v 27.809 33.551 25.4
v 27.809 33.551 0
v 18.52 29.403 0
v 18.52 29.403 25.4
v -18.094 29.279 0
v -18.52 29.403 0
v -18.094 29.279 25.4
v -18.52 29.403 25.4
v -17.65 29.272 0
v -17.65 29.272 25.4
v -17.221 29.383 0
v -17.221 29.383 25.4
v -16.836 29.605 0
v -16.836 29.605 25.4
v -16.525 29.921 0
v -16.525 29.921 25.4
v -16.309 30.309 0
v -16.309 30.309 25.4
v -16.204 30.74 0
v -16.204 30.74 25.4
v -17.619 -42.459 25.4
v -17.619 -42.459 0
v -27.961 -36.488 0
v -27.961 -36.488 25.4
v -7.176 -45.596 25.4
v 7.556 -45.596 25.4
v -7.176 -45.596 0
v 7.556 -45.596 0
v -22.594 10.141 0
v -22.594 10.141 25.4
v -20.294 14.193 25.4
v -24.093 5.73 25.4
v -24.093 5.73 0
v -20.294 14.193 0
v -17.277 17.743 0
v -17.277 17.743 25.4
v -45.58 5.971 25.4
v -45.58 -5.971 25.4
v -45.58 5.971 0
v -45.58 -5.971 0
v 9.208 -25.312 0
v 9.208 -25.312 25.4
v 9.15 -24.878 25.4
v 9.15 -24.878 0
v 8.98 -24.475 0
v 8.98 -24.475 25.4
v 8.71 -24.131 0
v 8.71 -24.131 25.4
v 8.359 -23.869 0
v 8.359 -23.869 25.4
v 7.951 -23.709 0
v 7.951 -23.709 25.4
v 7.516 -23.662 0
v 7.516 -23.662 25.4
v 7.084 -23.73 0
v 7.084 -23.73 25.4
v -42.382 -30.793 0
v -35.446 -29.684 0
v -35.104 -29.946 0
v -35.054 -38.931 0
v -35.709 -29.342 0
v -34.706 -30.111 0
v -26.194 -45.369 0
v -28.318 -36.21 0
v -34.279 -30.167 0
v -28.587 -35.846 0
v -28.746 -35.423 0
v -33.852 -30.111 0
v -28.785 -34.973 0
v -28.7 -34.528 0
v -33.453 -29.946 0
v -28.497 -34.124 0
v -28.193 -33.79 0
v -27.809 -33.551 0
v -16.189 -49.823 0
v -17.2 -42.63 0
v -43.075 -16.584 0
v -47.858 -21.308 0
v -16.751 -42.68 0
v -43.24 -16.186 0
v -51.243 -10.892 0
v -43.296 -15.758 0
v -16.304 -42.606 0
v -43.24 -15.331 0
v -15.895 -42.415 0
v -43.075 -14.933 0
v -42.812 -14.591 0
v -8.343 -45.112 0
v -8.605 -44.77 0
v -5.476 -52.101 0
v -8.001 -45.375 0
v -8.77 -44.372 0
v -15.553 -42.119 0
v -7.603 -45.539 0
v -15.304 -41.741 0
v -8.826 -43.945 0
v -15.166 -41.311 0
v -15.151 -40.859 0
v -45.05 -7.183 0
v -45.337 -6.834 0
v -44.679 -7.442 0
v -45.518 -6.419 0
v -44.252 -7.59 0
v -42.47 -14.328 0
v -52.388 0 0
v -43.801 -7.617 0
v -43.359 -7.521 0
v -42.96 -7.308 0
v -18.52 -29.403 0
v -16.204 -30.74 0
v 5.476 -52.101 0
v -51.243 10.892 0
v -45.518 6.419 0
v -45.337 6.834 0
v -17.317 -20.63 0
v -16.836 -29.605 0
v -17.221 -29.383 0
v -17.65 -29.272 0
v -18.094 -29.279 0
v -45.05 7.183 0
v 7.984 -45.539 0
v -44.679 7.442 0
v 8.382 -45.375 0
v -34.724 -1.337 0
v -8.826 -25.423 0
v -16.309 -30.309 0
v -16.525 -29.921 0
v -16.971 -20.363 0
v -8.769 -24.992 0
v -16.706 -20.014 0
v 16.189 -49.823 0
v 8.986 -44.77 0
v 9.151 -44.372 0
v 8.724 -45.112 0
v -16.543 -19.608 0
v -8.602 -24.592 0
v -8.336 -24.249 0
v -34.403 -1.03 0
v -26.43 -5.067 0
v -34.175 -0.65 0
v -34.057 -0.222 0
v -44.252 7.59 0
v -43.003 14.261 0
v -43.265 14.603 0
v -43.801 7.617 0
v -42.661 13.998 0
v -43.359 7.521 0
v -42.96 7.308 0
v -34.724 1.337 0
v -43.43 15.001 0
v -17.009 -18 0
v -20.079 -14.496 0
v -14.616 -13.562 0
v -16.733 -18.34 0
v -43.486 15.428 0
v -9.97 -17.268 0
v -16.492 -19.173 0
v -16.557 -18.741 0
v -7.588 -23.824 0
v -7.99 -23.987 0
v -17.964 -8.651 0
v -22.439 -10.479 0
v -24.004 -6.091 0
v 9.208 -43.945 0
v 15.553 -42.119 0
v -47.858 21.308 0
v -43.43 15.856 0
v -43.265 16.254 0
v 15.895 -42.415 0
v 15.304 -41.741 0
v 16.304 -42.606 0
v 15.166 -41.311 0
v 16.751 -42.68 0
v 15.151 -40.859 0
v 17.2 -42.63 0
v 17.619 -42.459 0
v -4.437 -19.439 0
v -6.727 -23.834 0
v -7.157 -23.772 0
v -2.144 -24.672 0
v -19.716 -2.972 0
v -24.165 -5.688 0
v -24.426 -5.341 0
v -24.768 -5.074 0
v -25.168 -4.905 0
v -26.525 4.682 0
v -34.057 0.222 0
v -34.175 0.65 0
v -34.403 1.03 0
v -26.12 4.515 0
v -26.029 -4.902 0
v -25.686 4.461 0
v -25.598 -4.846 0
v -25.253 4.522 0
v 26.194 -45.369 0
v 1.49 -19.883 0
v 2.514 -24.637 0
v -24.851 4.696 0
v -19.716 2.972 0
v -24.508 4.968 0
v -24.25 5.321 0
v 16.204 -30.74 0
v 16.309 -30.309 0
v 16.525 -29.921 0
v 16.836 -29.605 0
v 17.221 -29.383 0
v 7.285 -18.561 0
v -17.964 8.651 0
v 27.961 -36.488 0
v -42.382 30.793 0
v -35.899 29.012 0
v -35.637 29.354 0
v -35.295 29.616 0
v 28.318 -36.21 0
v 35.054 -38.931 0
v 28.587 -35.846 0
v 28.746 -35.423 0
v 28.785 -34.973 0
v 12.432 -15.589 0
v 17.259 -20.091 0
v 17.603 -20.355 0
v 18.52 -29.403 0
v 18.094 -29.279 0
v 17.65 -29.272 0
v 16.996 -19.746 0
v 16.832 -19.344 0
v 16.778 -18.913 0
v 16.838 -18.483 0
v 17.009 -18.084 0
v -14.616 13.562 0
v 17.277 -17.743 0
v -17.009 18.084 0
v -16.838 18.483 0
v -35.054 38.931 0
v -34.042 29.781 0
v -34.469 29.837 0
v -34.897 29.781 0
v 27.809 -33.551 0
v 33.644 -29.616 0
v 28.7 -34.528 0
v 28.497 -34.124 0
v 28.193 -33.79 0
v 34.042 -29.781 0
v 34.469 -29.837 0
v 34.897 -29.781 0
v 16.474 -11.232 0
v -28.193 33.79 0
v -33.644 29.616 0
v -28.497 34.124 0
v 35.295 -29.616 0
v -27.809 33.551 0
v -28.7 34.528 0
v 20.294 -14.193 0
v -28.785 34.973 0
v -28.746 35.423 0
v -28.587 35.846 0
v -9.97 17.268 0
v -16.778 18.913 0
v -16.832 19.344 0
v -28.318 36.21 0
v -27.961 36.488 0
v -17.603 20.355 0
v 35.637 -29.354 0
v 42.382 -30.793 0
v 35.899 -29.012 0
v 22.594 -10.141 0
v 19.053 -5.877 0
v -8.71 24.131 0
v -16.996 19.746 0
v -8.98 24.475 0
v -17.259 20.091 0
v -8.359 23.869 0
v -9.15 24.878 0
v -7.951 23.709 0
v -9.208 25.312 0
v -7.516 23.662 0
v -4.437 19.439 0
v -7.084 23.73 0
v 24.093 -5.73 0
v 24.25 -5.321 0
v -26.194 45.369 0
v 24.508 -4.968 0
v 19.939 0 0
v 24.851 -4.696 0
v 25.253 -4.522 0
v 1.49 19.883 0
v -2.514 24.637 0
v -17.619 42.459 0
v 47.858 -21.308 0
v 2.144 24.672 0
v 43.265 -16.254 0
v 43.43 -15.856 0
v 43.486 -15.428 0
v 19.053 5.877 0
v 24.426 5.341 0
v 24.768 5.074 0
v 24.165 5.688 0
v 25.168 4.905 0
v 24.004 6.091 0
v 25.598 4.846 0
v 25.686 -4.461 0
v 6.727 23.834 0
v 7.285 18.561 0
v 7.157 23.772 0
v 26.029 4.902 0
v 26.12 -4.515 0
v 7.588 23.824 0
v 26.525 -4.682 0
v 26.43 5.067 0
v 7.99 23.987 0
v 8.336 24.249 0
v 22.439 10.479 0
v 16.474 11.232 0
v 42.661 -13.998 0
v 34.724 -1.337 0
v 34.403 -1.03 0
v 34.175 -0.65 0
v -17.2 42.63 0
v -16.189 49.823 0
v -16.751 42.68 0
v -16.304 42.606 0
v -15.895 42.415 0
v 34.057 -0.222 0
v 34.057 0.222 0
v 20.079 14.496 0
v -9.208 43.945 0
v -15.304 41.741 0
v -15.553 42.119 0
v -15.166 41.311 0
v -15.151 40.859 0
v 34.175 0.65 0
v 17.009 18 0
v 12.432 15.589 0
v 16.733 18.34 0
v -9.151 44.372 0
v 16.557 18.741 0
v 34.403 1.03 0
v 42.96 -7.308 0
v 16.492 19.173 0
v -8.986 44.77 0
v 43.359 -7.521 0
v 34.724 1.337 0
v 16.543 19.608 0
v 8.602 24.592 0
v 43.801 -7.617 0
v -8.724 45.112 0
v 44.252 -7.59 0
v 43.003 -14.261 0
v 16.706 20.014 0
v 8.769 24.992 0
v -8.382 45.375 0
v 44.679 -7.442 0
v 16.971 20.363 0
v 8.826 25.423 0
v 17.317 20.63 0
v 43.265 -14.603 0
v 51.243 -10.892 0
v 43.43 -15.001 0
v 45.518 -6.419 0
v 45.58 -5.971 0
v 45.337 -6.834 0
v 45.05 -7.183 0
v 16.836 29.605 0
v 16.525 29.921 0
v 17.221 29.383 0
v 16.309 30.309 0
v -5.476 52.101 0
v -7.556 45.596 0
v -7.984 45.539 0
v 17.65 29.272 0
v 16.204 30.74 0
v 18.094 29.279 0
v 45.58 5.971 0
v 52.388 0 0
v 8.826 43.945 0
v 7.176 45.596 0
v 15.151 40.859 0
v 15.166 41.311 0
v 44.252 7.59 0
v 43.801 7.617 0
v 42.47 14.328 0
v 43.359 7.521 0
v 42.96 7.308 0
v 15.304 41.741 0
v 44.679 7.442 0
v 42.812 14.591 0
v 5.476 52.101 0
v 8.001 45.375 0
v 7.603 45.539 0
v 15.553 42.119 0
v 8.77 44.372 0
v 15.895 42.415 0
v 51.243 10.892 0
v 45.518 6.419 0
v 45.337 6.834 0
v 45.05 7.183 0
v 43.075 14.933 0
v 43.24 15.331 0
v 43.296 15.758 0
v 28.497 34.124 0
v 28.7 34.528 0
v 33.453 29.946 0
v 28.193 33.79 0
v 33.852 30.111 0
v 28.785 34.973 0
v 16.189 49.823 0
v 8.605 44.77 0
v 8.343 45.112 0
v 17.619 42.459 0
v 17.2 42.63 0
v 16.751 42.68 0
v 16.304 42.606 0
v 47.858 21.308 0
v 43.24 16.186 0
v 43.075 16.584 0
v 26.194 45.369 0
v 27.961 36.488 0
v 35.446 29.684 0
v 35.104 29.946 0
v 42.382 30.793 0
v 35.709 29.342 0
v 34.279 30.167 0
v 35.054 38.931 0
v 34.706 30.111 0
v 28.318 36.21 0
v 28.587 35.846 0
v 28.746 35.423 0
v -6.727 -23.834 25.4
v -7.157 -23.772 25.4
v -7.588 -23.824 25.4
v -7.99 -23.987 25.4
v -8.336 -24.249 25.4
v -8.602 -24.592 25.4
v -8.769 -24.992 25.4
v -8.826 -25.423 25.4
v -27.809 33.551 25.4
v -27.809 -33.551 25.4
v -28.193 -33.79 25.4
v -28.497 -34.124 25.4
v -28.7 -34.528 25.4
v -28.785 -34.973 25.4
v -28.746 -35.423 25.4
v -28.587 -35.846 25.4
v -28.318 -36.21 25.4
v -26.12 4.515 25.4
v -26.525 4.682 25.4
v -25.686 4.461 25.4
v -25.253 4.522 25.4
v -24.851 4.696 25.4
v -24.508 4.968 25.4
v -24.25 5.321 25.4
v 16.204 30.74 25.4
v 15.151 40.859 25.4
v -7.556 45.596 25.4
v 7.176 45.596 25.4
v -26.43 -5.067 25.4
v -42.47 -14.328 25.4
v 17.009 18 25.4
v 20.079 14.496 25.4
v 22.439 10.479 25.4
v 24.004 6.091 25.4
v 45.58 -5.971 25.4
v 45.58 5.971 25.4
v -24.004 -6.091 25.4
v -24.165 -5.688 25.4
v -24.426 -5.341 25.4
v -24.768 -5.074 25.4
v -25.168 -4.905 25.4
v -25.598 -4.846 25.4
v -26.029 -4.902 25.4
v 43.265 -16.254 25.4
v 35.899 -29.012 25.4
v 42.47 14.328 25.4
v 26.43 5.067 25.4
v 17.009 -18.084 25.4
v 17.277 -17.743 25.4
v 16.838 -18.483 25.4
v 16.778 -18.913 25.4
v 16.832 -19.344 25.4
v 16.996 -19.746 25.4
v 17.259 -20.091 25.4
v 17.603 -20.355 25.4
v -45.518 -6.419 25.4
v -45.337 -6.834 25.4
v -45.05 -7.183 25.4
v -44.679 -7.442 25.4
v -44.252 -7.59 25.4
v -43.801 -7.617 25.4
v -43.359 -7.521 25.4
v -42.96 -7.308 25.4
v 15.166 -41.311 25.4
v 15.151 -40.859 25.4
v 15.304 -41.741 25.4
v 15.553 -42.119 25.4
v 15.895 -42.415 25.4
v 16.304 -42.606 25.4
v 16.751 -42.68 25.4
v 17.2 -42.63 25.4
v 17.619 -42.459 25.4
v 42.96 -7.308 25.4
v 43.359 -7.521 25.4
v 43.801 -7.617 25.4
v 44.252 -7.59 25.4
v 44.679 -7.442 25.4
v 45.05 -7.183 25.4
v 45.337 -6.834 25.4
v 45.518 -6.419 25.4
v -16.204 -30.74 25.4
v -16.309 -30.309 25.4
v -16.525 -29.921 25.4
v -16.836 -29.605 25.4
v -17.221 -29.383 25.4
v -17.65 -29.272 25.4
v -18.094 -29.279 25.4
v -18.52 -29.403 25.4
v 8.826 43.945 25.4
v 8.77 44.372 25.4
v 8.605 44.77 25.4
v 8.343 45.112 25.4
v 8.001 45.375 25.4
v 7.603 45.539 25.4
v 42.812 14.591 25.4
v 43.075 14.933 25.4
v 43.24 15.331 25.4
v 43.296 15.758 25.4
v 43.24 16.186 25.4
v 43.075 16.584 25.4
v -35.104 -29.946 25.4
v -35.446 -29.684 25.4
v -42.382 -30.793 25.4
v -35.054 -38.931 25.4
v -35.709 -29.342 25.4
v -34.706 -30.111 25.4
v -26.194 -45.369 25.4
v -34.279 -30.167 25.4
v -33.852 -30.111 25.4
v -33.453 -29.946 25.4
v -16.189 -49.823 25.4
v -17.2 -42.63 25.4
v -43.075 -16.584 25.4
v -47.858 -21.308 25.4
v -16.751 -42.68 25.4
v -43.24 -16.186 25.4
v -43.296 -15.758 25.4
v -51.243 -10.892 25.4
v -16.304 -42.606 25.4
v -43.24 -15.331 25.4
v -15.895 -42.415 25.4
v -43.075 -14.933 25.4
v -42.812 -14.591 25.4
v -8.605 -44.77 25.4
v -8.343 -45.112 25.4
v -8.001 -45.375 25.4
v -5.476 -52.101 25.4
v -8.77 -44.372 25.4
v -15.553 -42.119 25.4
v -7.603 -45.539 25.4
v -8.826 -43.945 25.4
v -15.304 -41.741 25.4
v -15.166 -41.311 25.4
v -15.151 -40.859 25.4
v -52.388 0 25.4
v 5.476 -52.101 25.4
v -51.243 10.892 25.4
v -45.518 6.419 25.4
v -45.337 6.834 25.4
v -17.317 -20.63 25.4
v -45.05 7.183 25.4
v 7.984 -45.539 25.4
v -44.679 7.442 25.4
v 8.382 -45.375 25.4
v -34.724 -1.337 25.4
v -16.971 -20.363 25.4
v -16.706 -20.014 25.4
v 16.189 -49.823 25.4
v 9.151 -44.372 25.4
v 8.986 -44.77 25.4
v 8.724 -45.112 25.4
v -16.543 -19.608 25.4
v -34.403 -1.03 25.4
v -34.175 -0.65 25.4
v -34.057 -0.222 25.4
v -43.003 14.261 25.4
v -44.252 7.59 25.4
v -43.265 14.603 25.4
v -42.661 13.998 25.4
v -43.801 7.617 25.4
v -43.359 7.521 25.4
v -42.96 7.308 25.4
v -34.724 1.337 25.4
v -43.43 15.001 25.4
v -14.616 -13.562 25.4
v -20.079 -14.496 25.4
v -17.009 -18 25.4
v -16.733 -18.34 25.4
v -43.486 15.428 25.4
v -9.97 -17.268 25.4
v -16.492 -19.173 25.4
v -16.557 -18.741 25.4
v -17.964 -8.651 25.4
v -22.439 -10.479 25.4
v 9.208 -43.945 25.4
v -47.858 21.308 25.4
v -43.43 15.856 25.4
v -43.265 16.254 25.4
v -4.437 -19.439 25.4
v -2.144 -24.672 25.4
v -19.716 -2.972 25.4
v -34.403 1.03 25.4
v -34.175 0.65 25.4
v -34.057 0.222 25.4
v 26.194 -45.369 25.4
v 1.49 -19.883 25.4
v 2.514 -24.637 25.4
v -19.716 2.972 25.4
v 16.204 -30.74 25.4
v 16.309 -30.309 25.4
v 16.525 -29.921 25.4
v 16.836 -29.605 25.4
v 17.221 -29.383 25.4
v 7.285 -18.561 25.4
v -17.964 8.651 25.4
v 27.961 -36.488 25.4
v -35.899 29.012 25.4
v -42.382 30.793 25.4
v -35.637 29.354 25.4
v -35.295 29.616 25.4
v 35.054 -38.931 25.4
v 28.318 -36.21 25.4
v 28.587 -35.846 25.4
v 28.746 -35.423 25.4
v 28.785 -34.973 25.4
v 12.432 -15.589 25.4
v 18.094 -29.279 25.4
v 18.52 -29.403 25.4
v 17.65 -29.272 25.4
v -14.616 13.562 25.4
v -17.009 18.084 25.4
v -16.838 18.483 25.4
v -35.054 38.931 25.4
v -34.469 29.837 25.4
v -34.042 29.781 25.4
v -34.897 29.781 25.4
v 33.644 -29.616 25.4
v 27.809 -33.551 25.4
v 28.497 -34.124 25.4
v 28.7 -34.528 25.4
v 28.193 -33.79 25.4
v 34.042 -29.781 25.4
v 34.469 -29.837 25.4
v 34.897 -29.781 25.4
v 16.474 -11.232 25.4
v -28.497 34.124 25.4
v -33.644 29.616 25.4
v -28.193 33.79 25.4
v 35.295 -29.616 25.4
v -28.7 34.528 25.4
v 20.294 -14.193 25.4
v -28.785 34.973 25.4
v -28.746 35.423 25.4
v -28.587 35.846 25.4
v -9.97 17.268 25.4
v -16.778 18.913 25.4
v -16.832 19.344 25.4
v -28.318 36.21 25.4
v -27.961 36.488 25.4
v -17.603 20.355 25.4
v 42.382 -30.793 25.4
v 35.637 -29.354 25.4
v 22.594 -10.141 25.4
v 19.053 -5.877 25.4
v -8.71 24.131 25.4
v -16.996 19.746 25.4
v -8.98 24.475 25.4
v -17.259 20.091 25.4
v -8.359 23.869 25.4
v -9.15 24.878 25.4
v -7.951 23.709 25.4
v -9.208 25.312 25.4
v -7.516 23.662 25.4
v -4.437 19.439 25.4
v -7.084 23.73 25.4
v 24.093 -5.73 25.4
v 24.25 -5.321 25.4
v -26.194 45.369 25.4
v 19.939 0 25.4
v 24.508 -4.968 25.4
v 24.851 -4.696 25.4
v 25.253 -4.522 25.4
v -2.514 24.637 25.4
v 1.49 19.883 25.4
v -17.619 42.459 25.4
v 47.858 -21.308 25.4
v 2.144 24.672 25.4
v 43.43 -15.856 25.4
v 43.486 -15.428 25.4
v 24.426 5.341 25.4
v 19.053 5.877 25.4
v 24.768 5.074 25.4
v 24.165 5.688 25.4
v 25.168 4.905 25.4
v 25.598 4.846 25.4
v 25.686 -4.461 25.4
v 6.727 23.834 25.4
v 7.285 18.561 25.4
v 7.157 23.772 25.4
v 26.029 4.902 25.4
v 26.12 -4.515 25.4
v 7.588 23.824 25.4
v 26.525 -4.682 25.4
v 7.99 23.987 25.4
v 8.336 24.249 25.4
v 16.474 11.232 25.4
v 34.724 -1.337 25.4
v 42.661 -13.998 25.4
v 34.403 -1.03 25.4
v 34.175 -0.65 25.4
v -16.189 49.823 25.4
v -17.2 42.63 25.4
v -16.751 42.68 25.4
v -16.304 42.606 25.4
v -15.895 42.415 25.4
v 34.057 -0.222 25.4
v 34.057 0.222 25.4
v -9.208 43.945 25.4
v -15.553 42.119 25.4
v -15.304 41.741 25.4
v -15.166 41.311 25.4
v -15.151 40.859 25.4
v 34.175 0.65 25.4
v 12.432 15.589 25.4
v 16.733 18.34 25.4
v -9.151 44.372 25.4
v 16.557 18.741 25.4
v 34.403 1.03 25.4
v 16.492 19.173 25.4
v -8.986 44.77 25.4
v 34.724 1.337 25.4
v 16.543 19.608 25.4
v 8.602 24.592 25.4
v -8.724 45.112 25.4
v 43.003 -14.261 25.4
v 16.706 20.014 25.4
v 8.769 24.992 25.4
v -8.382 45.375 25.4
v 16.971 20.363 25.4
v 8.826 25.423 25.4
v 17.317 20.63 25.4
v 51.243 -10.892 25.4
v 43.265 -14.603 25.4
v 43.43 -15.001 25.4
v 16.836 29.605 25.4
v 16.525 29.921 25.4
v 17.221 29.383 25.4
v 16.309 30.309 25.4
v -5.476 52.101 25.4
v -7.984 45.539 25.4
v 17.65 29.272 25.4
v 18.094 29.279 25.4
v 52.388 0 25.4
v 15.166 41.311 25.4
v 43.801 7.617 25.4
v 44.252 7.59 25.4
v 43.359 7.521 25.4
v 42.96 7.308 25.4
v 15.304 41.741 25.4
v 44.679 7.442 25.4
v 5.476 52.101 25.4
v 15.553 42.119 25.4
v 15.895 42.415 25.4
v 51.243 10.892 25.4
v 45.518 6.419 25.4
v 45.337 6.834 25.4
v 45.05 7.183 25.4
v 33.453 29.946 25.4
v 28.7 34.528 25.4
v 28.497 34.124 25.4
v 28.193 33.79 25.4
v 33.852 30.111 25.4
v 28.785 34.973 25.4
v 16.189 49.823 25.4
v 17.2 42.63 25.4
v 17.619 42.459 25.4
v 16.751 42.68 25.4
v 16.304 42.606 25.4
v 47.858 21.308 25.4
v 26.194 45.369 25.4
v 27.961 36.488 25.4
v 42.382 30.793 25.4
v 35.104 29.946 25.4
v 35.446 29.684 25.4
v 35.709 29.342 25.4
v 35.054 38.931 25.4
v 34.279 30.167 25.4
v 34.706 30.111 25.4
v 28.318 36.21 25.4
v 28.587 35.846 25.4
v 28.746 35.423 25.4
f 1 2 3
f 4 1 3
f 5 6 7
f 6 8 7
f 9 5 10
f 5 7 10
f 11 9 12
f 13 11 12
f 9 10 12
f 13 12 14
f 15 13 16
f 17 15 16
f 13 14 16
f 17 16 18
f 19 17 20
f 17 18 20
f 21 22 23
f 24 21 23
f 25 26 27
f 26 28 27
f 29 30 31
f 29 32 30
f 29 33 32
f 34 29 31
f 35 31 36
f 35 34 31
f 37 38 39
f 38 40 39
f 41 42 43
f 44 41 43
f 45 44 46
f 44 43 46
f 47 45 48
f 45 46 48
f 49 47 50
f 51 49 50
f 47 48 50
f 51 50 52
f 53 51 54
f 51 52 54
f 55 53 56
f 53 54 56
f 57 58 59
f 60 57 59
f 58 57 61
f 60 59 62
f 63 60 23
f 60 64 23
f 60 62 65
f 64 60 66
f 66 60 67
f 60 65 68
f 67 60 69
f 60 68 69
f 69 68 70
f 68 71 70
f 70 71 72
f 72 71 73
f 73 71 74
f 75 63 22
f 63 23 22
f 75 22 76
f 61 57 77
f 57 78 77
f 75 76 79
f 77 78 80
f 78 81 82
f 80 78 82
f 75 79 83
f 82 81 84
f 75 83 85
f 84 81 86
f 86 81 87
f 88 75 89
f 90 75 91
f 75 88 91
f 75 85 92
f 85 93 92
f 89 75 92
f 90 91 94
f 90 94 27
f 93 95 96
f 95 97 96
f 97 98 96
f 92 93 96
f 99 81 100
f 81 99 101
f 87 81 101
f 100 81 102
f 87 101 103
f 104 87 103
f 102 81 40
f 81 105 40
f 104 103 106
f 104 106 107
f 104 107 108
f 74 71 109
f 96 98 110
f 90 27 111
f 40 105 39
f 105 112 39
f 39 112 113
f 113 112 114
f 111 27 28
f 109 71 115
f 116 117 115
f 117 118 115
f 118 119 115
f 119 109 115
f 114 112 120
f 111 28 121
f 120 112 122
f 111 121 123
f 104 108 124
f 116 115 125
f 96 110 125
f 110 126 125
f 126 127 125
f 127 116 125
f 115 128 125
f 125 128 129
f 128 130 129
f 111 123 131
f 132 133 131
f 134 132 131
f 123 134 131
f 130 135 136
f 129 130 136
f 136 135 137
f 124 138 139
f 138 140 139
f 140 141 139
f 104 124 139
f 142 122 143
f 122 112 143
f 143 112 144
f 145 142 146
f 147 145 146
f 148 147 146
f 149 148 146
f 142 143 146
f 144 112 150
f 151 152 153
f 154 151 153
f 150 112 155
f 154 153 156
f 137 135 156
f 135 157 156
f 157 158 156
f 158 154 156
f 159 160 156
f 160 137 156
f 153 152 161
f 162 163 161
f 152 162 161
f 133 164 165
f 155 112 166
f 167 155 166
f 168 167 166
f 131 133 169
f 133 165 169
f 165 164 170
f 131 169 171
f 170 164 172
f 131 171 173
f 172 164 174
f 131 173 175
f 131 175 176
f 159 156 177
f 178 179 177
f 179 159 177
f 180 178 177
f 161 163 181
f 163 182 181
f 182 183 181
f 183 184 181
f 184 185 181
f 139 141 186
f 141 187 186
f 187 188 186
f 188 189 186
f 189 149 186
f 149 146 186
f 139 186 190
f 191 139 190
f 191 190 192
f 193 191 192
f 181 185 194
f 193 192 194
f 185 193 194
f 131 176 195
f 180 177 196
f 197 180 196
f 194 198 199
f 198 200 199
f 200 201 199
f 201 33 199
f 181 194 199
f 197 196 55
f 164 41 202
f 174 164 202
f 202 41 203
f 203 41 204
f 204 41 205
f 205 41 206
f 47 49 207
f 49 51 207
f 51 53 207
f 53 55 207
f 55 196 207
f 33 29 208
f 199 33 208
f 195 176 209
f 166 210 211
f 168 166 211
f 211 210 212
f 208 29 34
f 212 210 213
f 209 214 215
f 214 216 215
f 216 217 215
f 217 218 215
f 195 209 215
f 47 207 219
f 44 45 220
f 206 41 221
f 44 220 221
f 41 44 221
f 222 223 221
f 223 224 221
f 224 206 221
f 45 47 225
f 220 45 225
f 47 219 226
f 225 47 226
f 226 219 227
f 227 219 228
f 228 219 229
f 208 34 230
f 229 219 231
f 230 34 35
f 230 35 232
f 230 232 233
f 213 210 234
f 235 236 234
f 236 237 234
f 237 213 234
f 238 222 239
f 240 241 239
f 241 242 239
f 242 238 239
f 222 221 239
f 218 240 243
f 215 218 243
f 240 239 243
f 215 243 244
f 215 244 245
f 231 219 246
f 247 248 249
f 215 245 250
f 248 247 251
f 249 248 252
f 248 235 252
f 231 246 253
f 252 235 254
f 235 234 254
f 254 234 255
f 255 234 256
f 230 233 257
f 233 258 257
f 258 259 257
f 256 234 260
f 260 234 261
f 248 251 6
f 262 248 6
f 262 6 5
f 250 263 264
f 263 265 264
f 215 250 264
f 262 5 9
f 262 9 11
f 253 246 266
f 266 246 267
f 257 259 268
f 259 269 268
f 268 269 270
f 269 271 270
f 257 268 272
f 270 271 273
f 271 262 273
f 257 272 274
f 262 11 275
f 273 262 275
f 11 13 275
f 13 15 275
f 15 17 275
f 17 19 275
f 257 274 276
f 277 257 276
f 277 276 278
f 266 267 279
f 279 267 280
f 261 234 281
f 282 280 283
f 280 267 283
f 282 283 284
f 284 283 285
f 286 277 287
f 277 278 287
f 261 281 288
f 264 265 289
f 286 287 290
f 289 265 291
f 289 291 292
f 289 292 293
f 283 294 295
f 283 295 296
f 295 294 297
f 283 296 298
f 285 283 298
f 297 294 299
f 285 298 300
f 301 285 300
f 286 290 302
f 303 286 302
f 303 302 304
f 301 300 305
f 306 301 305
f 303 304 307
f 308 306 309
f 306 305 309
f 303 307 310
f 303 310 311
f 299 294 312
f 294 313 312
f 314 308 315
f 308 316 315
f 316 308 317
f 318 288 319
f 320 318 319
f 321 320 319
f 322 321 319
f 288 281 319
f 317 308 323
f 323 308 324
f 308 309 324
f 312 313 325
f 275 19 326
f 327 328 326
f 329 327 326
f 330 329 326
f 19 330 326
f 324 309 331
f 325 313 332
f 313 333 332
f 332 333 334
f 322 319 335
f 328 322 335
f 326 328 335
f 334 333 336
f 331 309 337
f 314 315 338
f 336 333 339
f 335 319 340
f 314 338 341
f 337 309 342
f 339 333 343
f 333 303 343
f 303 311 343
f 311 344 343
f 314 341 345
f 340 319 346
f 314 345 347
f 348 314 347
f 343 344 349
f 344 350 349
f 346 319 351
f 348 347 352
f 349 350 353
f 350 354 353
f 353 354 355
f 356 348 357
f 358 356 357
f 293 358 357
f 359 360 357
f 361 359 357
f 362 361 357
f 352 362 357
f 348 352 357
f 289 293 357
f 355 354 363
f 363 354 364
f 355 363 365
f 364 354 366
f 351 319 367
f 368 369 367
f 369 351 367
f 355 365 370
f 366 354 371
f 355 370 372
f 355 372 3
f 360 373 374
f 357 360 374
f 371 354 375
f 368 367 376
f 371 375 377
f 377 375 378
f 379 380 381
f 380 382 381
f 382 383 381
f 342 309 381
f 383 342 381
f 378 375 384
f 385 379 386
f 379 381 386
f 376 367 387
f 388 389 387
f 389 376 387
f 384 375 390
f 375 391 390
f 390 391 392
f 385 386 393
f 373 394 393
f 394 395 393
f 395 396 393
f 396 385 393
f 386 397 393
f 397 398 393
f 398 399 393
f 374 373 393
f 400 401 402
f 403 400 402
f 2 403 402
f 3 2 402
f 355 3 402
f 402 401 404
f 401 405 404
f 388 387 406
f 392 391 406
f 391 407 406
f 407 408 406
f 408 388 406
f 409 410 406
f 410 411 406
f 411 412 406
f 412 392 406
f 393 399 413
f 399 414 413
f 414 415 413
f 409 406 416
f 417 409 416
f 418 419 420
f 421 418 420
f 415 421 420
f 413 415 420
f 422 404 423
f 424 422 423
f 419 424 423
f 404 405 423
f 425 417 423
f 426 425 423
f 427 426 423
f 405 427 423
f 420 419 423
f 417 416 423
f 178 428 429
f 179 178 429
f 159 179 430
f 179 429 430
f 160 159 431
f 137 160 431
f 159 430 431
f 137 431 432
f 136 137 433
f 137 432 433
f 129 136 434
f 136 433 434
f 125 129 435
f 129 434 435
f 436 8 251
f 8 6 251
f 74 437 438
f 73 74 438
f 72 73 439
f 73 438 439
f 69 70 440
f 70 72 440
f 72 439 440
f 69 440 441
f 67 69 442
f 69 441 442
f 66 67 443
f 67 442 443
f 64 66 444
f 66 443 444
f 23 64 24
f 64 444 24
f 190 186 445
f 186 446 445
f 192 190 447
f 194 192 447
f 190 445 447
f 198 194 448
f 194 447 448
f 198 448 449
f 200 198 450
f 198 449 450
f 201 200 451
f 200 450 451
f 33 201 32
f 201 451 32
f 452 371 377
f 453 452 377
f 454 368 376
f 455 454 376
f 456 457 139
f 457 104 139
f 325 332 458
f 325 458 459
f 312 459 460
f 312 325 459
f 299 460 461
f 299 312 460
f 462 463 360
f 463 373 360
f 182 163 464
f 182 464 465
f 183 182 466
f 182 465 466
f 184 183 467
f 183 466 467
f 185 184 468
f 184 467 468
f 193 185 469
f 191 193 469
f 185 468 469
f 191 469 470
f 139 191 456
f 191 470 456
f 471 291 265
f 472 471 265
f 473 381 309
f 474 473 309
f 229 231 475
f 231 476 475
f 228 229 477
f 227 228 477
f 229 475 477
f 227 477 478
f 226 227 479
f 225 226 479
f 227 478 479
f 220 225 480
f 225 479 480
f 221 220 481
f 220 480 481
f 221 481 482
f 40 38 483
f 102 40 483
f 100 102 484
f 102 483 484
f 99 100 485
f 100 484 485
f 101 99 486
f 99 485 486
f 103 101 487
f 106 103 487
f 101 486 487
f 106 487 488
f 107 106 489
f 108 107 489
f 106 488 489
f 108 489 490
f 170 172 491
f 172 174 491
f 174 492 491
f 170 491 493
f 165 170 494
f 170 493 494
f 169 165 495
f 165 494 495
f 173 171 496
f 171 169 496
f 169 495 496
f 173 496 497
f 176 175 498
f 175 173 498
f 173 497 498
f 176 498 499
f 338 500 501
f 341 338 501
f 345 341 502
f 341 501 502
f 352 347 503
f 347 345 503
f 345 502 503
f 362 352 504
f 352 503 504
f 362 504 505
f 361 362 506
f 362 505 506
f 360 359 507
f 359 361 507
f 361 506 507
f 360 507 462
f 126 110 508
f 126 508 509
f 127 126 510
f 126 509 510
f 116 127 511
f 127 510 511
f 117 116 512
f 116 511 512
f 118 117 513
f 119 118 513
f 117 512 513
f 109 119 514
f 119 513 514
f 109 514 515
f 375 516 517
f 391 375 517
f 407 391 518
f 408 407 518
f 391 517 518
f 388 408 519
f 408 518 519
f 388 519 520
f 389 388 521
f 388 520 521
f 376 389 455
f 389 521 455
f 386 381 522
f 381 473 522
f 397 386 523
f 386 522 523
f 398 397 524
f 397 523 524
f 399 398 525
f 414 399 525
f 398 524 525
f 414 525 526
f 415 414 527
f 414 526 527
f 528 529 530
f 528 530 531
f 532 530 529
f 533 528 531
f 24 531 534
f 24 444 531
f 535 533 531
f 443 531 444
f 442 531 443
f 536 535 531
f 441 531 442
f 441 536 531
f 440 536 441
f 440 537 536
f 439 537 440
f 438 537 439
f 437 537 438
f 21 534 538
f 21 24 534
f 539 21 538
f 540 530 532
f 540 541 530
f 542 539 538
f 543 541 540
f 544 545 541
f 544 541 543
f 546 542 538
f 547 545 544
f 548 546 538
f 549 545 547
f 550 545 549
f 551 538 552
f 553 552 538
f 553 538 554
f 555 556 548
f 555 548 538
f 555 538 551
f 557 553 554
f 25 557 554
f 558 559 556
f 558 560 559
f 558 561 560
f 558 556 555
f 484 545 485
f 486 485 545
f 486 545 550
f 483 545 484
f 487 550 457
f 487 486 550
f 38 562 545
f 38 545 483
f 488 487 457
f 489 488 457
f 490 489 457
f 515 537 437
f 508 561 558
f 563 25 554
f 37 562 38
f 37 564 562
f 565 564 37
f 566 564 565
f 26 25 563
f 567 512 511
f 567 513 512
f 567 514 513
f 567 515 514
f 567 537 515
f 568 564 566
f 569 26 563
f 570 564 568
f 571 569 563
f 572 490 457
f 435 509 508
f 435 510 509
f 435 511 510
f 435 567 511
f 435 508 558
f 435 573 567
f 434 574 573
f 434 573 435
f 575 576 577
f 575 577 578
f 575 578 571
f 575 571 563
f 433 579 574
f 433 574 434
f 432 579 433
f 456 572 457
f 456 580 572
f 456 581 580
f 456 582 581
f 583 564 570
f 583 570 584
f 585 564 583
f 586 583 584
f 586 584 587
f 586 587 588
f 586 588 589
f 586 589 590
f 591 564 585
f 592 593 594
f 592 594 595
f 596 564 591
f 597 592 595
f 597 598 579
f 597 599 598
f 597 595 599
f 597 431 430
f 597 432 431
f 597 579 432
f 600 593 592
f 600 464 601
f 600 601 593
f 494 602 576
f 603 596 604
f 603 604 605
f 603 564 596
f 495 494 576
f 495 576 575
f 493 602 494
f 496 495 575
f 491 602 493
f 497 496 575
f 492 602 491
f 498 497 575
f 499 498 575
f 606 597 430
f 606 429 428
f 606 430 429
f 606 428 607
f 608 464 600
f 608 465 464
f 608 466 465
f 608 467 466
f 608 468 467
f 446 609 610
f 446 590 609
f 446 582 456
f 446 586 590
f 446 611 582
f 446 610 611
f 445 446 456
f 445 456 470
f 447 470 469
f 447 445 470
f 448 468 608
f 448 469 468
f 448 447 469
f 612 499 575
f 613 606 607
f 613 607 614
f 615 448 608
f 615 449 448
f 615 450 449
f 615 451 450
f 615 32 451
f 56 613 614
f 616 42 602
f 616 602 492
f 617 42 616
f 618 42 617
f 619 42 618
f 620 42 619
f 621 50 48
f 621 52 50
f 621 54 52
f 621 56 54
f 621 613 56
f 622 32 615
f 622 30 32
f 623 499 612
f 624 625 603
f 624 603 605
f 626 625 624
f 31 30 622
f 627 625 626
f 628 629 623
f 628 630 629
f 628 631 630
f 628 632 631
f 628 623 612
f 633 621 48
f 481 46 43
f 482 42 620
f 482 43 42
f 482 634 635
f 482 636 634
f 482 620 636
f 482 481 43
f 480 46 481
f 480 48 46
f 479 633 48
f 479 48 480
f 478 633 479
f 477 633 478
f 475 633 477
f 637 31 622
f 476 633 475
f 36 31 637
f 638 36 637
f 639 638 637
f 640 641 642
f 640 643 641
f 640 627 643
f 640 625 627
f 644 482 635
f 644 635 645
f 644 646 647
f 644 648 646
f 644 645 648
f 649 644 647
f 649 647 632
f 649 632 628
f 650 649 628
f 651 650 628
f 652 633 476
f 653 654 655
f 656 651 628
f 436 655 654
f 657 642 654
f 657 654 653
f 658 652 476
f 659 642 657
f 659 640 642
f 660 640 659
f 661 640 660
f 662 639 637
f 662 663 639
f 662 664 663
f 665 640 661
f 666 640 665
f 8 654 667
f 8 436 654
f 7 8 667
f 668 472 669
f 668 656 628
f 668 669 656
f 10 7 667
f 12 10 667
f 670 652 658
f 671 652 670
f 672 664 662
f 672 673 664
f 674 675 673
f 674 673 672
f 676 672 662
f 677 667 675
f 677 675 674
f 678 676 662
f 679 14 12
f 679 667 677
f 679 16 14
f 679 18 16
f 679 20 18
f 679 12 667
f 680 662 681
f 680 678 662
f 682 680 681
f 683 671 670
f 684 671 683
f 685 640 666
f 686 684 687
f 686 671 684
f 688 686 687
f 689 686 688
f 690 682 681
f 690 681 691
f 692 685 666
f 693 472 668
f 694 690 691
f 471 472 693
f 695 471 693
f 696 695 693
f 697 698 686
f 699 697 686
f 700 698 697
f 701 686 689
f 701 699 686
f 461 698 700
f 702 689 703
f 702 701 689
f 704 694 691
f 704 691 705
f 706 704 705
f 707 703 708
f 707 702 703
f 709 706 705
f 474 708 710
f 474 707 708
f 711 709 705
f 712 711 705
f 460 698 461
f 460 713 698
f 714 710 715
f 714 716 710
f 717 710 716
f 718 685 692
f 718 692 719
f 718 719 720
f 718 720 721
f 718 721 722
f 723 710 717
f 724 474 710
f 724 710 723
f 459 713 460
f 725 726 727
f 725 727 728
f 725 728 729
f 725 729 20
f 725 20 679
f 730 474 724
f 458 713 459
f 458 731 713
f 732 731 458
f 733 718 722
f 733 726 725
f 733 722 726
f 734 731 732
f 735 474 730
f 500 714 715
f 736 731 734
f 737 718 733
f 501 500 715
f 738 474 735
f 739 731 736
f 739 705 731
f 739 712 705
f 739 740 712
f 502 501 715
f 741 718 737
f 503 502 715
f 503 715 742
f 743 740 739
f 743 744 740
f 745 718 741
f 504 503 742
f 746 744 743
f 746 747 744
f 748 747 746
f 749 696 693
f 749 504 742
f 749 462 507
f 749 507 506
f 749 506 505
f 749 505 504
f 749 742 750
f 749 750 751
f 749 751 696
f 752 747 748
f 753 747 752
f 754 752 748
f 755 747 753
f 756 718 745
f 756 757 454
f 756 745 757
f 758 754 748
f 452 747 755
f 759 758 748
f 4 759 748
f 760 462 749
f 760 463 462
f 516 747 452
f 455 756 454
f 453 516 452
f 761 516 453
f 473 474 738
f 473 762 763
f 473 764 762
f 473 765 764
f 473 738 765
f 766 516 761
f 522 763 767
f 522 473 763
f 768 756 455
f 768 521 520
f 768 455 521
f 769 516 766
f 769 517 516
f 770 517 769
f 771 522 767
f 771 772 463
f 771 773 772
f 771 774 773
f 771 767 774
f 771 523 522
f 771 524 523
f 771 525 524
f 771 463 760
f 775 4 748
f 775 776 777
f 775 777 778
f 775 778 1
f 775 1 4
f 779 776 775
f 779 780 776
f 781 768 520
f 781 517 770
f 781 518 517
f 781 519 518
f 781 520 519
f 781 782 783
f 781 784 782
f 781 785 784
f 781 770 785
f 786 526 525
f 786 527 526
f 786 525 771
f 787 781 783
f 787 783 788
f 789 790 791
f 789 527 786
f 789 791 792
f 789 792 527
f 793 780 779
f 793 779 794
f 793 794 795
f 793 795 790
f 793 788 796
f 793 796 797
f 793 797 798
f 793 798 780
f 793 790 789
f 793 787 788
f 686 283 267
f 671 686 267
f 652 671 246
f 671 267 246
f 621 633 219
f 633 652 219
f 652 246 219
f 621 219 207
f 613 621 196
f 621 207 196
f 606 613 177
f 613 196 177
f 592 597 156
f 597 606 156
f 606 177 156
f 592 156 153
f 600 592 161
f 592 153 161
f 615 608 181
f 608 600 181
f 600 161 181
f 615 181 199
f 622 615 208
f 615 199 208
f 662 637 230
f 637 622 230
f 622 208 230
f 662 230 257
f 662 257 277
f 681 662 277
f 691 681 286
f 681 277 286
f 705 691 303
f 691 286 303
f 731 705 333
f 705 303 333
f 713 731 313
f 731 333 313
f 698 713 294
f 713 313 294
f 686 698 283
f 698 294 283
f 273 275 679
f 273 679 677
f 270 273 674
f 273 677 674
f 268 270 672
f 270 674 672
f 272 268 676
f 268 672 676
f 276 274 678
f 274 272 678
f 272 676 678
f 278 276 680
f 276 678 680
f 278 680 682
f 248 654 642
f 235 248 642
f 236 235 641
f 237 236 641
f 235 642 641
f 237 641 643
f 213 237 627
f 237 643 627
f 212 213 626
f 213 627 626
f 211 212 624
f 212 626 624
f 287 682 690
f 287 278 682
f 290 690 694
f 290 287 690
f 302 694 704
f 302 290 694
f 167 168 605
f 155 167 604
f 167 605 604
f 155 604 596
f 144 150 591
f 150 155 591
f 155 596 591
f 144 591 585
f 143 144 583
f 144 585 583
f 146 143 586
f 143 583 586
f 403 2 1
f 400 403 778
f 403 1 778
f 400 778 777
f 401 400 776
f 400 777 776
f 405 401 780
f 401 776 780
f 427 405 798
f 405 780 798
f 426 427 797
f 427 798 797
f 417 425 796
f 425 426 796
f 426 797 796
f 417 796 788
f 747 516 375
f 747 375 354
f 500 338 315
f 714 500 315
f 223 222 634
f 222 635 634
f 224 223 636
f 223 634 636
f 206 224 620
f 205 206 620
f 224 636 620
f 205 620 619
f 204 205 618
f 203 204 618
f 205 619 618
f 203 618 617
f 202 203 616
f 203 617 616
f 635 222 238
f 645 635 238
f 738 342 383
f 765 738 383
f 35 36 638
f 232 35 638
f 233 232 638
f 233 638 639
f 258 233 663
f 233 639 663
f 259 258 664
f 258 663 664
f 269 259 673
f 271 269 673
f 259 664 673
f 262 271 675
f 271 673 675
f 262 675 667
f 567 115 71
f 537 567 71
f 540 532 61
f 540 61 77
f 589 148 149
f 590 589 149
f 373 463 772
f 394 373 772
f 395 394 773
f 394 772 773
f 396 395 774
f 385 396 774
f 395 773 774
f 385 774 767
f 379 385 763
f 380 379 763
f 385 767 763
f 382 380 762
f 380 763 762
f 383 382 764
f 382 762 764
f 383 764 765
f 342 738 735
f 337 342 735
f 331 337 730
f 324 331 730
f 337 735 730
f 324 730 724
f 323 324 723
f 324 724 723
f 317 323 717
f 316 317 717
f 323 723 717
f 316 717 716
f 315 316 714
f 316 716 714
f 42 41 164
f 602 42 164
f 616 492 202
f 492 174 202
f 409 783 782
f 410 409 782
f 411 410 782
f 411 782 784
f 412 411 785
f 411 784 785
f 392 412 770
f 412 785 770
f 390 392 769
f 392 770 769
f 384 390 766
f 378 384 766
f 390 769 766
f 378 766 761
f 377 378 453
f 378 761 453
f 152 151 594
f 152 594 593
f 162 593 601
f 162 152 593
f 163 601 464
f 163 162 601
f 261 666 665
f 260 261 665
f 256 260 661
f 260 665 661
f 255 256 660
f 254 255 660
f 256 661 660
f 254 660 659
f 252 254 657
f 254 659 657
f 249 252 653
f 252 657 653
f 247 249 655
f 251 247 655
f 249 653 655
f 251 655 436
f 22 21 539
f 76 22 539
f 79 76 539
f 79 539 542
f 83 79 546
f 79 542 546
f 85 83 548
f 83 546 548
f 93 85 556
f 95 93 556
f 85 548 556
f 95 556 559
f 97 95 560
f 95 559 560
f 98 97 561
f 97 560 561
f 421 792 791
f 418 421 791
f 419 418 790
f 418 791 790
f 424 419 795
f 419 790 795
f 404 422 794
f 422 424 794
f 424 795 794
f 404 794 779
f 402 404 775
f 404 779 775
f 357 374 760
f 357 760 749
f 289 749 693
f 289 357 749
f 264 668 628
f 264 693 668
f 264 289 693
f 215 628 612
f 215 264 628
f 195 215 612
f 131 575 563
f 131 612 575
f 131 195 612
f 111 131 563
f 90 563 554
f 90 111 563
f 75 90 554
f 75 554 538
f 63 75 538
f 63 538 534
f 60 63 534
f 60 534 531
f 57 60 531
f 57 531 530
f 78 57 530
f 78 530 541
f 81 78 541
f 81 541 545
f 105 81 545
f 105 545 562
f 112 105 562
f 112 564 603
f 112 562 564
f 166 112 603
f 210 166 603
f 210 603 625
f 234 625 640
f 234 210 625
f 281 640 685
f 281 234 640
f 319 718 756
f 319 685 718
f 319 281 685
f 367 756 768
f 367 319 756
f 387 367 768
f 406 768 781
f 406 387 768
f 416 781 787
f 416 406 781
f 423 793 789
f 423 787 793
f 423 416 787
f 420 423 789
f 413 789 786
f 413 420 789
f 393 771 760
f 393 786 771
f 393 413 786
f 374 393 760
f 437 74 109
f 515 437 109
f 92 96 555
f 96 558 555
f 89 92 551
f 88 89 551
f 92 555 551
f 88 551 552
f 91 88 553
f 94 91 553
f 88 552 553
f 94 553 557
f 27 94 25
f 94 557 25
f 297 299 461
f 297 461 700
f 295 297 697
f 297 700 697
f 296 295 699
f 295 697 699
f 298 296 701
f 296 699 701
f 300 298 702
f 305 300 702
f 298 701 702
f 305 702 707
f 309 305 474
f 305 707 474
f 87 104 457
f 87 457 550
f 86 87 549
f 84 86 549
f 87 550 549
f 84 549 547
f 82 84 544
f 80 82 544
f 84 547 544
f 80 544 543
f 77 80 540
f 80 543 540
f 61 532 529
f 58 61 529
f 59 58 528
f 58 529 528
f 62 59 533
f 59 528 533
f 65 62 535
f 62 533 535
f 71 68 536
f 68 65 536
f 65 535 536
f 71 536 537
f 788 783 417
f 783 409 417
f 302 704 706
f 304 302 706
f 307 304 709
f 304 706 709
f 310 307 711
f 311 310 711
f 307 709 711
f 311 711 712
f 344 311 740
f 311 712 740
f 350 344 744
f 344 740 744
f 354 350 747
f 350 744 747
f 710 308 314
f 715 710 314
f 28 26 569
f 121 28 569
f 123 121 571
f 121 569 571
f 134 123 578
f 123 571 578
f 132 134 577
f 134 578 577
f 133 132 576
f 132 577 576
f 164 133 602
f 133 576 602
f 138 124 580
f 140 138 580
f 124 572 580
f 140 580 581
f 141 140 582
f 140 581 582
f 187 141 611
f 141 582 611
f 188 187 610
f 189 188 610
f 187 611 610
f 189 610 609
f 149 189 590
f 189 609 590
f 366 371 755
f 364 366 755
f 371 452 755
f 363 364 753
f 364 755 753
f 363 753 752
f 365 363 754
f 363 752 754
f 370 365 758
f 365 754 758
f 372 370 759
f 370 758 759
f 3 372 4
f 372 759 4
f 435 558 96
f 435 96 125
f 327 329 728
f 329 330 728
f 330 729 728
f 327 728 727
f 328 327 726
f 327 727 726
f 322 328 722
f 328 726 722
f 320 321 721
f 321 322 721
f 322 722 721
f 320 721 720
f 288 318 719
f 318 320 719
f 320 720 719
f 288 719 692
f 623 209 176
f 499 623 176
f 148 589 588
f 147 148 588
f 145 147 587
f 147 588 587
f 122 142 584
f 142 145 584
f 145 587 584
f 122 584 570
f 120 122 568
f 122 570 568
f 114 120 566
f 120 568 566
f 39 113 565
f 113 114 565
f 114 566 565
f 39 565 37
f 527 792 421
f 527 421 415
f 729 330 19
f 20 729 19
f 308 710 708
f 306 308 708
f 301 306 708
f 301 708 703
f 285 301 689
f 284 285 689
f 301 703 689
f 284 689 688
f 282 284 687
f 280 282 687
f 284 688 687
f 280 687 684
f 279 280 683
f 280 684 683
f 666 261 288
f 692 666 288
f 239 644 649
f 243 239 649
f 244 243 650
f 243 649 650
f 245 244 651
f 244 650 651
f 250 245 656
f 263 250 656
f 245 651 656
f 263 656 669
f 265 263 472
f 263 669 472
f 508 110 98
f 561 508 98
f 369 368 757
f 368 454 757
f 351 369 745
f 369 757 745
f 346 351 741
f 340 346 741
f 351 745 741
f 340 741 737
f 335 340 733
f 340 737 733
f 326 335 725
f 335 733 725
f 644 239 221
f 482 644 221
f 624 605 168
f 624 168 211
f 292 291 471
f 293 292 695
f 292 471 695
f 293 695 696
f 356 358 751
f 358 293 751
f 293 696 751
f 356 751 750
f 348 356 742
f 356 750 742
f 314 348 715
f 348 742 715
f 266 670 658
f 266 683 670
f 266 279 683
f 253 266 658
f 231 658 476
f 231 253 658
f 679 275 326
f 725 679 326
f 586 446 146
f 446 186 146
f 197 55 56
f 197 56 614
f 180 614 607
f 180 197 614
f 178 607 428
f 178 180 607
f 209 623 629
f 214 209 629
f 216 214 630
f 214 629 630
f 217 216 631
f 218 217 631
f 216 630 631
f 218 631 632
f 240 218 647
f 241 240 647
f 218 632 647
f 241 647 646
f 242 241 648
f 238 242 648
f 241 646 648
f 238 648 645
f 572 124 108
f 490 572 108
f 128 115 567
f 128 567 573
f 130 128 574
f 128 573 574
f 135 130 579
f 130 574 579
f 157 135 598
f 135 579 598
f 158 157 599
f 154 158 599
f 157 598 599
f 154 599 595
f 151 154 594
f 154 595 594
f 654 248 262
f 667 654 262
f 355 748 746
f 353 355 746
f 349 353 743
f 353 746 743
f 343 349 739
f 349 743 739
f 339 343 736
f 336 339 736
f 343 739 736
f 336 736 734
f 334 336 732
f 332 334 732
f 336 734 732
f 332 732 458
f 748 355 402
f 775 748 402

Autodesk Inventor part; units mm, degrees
ref_plane "YZ Plane" through (0, 0, 0) normal (1, 0, 0) x (0, 1, 0)
ref_plane "XZ Plane" through (0, 0, 0) normal (0, 1, 0) x (-1, 0, 0)
ref_plane "XY Plane" through (0, 0, 0) normal (0, 0, 1) x (1, 0, 0)
sketch "Sketch1" plane through (0, 0, 0) normal (0, 0, 1) x (1, 0, 0)
  circle A0 centre (0, 0) radius 19.939
  circle A1 centre (0, 0) radius 52.3875
  line L0 (-9.2075, 22.9897) -> (-9.2075, 45.5957)
  line L1 (-9.2075, 45.5957) -> (8.8265, 45.5957)
  line L2 (8.8265, 45.5957) -> (8.8265, 23.1387)
  line L3 (-44.0908, 14.8239) -> (-35.0738, 30.4418)
  line L4 (-35.0738, 30.4418) -> (-15.6254, 19.2133)
  line L5 (-24.5134, 3.5209) -> (-44.0908, 14.8239)
  line L6 (-34.8833, -30.7718) -> (-43.9003, -15.1539)
  line L7 (-43.9003, -15.1539) -> (-24.4519, -3.9254)
  line L8 (-15.3059, -19.4688) -> (-34.8833, -30.7718)
  line L9 (9.2075, -45.5957) -> (-8.8265, -45.5957)
  line L10 (-8.8265, -45.5957) -> (-8.8265, -23.1387)
  line L11 (9.2075, -22.9897) -> (9.2075, -45.5957)
  line L12 (44.0908, -14.8239) -> (35.0738, -30.4418)
  line L13 (35.0738, -30.4418) -> (15.6254, -19.2133)
  line L14 (24.5134, -3.5209) -> (44.0908, -14.8239)
  line L15 (34.8833, 30.7718) -> (43.9003, 15.1539)
  line L16 (43.9003, 15.1539) -> (24.4519, 3.9254)
  line L17 (15.3059, 19.4688) -> (34.8833, 30.7718)
  arc A2 (8.8265, 23.1387) -> (-9.2075, 22.9897) centre (0, 0) ccw
  arc A3 (-15.6254, 19.2133) -> (-24.5134, 3.5209) centre (0, 0) ccw
  arc A4 (24.4519, 3.9254) -> (15.3059, 19.4688) centre (0, 0) ccw
  arc A5 (15.6254, -19.2133) -> (24.5134, -3.5209) centre (0, 0) ccw
  arc A6 (-24.4519, -3.9254) -> (-15.3059, -19.4688) centre (0, 0) ccw
  arc A7 (-8.8265, -23.1387) -> (9.2075, -22.9897) centre (0, 0) ccw
  line L18 (-45.5802, 9.2075) -> (-32.8802, 0)
  line L19 (-32.8802, 0) -> (-45.5802, -9.2075)
  line L20 (-45.5802, -9.2075) -> (-45.5802, 9.2075)
  line L21 (-30.764, -34.8699) -> (-16.4401, -28.4751)
  line L22 (-14.8162, -44.0774) -> (-30.764, -34.8699)
  line L23 (-16.4401, -28.4751) -> (-14.8162, -44.0774)
  line L24 (14.8162, -44.0774) -> (16.4401, -28.4751)
  line L25 (30.764, -34.8699) -> (14.8162, -44.0774)
  line L26 (16.4401, -28.4751) -> (30.764, -34.8699)
  line L27 (45.5802, -9.2075) -> (32.8802, 0)
  line L28 (45.5802, 9.2075) -> (45.5802, -9.2075)
  line L29 (32.8802, 0) -> (45.5802, 9.2075)
  line L30 (30.764, 34.8699) -> (16.4401, 28.4751)
  line L31 (14.8162, 44.0774) -> (30.764, 34.8699)
  line L32 (16.4401, 28.4751) -> (14.8162, 44.0774)
  line L33 (-14.8162, 44.0774) -> (-16.4401, 28.4751)
  line L34 (-30.764, 34.8699) -> (-14.8162, 44.0774)
  line L35 (-16.4401, 28.4751) -> (-30.764, 34.8699)
  dimension "d0" = 39.878
  dimension "d3" = 104.775
  dimension "d38" = 22.606
  dimension "d39" = 18.034
  dimension "d40" = 9.2075
  dimension "d41" = 360
  dimension "d42" = 9.2075
  dimension "d43" = 9.2075
  dimension "d44" = 9.2075
  dimension "d45" = 12.7
  dimension "d46" = 12.7
  dimension "d49" = 360
extrude "Extrusion2" add sketch "Sketch1" along normal blind 25.4
fillet "Fillet1" radius 1.651 42 edges at (-15.6254, 19.2133, 12.7) (8.8265, 45.5957, 12.7) (30.764, 34.8699, 12.7) (43.9003, 15.1539, 12.7) (-32.8802, 0, 12.7) (-15.3059, -19.4688, 12.7) (-44.0908, 14.8239, 12.7) (-30.764, 34.8699, 12.7) (15.3059, 19.4688, 12.7) (15.6254, -19.2133, 12.7) (32.8802, 0, 12.7) (-30.764, -34.8699, 12.7) (-43.9003, -15.1539, 12.7) (-9.2075, 22.9897, 12.7) (16.4401, 28.4751, 12.7) (24.4519, 3.9254, 12.7) (9.2075, -45.5957, 12.7) (35.0738, -30.4418, 12.7) (45.5802, -9.2075, 12.7) (-14.8162, -44.0774, 12.7) (-24.5134, 3.5209, 12.7) (8.8265, 23.1387, 12.7) (-16.4401, 28.4751, 12.7) (-34.8833, -30.7718, 12.7) (-8.8265, -45.5957, 12.7) (14.8162, -44.0774, 12.7) (-45.5802, -9.2075, 12.7) (-45.5802, 9.2075, 12.7) (-35.0738, 30.4418, 12.7) (-9.2075, 45.5957, 12.7) (-8.8265, -23.1387, 12.7) (24.5134, -3.5209, 12.7) (16.4401, -28.4751, 12.7) (14.8162, 44.0774, 12.7) (9.2075, -22.9897, 12.7) (44.0908, -14.8239, 12.7) (30.764, -34.8699, 12.7) (34.8833, 30.7718, 12.7) (45.5802, 9.2075, 12.7) (-16.4401, -28.4751, 12.7) (-24.4519, -3.9254, 12.7) (-14.8162, 44.0774, 12.7)
properties part number "EXPANDED FLEX WHEEL"
